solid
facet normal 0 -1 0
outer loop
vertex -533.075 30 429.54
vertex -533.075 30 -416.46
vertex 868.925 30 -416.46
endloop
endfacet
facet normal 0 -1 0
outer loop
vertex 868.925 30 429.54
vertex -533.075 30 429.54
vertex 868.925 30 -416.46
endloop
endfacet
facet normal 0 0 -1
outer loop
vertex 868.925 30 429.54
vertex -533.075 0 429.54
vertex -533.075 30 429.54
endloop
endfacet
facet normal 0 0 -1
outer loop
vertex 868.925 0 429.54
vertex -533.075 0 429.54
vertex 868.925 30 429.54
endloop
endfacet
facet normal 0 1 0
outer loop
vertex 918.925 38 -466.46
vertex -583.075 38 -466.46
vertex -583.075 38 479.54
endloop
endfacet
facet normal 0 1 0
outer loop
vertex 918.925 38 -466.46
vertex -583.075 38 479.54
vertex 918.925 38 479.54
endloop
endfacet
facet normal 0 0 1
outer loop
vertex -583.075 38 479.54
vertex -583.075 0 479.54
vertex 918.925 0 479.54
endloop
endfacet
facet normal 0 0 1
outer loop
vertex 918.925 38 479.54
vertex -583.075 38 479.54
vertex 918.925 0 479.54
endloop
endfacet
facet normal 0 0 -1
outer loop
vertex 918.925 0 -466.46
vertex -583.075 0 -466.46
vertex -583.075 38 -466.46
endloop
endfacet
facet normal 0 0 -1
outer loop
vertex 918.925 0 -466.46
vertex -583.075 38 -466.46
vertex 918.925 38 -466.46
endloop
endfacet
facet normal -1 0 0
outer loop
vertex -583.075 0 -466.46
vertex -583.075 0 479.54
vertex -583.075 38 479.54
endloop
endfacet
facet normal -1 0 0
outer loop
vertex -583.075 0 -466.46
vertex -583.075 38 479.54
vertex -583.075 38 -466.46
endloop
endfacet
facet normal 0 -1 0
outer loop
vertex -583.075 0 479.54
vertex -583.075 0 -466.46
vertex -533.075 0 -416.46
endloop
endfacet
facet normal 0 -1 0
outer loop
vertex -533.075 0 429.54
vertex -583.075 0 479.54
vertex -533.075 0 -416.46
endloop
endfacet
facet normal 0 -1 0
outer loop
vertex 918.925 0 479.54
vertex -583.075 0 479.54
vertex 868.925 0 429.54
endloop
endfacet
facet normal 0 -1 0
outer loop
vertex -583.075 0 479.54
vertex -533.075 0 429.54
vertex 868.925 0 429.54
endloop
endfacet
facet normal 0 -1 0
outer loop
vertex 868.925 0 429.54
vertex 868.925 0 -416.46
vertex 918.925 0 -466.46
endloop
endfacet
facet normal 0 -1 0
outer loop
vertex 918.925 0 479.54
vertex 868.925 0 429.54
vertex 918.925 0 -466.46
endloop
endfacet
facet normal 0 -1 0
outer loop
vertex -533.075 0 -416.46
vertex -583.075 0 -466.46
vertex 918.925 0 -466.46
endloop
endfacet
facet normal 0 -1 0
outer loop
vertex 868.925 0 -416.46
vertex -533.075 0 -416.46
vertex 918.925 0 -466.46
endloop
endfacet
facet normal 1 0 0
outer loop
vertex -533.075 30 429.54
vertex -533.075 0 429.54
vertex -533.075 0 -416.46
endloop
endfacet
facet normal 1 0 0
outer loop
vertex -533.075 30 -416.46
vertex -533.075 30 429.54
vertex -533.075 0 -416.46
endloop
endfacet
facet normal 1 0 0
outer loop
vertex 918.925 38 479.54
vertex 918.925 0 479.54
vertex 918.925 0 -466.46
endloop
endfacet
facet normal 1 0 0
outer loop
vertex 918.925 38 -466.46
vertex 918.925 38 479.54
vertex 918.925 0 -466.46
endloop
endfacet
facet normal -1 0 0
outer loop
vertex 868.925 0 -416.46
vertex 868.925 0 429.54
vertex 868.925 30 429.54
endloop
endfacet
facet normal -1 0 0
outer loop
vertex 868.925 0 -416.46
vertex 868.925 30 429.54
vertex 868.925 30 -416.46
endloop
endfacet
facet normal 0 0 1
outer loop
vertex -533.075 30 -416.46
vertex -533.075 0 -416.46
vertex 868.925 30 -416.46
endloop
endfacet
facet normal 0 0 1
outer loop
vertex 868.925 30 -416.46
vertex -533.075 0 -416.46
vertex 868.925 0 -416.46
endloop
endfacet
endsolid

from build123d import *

# Parameters (mm, degrees)
SKETCH1_W           = 1502
SKETCH1_H           = 946
BOSS_EXTRUDE1_DEPTH = 38
SKETCH1_4_W         = 1402
SKETCH1_4_H         = 846
CUT_EXTRUDE1_DEPTH  = 30


with BuildPart() as part:
    # Sketch1 → Boss-Extrude1 (new body)
    with BuildSketch(Plane(origin=(0, 0, 0), x_dir=(1, 0, 0), z_dir=(0, 1, 0))):
        with Locations((167.925465839, -6.540372671)):
            Rectangle(SKETCH1_W, SKETCH1_H)
    extrude(amount=BOSS_EXTRUDE1_DEPTH)

    # Sketch1<4> → Cut-Extrude1 (cut)
    with BuildSketch(Plane(origin=(0, 0, 0), x_dir=(1, 0, 0), z_dir=(0, 1, 0))):
        with Locations((167.925465839, -6.540372671)):
            Rectangle(SKETCH1_4_W, SKETCH1_4_H)
    extrude(amount=CUT_EXTRUDE1_DEPTH, mode=Mode.SUBTRACT)


solid = part.part
